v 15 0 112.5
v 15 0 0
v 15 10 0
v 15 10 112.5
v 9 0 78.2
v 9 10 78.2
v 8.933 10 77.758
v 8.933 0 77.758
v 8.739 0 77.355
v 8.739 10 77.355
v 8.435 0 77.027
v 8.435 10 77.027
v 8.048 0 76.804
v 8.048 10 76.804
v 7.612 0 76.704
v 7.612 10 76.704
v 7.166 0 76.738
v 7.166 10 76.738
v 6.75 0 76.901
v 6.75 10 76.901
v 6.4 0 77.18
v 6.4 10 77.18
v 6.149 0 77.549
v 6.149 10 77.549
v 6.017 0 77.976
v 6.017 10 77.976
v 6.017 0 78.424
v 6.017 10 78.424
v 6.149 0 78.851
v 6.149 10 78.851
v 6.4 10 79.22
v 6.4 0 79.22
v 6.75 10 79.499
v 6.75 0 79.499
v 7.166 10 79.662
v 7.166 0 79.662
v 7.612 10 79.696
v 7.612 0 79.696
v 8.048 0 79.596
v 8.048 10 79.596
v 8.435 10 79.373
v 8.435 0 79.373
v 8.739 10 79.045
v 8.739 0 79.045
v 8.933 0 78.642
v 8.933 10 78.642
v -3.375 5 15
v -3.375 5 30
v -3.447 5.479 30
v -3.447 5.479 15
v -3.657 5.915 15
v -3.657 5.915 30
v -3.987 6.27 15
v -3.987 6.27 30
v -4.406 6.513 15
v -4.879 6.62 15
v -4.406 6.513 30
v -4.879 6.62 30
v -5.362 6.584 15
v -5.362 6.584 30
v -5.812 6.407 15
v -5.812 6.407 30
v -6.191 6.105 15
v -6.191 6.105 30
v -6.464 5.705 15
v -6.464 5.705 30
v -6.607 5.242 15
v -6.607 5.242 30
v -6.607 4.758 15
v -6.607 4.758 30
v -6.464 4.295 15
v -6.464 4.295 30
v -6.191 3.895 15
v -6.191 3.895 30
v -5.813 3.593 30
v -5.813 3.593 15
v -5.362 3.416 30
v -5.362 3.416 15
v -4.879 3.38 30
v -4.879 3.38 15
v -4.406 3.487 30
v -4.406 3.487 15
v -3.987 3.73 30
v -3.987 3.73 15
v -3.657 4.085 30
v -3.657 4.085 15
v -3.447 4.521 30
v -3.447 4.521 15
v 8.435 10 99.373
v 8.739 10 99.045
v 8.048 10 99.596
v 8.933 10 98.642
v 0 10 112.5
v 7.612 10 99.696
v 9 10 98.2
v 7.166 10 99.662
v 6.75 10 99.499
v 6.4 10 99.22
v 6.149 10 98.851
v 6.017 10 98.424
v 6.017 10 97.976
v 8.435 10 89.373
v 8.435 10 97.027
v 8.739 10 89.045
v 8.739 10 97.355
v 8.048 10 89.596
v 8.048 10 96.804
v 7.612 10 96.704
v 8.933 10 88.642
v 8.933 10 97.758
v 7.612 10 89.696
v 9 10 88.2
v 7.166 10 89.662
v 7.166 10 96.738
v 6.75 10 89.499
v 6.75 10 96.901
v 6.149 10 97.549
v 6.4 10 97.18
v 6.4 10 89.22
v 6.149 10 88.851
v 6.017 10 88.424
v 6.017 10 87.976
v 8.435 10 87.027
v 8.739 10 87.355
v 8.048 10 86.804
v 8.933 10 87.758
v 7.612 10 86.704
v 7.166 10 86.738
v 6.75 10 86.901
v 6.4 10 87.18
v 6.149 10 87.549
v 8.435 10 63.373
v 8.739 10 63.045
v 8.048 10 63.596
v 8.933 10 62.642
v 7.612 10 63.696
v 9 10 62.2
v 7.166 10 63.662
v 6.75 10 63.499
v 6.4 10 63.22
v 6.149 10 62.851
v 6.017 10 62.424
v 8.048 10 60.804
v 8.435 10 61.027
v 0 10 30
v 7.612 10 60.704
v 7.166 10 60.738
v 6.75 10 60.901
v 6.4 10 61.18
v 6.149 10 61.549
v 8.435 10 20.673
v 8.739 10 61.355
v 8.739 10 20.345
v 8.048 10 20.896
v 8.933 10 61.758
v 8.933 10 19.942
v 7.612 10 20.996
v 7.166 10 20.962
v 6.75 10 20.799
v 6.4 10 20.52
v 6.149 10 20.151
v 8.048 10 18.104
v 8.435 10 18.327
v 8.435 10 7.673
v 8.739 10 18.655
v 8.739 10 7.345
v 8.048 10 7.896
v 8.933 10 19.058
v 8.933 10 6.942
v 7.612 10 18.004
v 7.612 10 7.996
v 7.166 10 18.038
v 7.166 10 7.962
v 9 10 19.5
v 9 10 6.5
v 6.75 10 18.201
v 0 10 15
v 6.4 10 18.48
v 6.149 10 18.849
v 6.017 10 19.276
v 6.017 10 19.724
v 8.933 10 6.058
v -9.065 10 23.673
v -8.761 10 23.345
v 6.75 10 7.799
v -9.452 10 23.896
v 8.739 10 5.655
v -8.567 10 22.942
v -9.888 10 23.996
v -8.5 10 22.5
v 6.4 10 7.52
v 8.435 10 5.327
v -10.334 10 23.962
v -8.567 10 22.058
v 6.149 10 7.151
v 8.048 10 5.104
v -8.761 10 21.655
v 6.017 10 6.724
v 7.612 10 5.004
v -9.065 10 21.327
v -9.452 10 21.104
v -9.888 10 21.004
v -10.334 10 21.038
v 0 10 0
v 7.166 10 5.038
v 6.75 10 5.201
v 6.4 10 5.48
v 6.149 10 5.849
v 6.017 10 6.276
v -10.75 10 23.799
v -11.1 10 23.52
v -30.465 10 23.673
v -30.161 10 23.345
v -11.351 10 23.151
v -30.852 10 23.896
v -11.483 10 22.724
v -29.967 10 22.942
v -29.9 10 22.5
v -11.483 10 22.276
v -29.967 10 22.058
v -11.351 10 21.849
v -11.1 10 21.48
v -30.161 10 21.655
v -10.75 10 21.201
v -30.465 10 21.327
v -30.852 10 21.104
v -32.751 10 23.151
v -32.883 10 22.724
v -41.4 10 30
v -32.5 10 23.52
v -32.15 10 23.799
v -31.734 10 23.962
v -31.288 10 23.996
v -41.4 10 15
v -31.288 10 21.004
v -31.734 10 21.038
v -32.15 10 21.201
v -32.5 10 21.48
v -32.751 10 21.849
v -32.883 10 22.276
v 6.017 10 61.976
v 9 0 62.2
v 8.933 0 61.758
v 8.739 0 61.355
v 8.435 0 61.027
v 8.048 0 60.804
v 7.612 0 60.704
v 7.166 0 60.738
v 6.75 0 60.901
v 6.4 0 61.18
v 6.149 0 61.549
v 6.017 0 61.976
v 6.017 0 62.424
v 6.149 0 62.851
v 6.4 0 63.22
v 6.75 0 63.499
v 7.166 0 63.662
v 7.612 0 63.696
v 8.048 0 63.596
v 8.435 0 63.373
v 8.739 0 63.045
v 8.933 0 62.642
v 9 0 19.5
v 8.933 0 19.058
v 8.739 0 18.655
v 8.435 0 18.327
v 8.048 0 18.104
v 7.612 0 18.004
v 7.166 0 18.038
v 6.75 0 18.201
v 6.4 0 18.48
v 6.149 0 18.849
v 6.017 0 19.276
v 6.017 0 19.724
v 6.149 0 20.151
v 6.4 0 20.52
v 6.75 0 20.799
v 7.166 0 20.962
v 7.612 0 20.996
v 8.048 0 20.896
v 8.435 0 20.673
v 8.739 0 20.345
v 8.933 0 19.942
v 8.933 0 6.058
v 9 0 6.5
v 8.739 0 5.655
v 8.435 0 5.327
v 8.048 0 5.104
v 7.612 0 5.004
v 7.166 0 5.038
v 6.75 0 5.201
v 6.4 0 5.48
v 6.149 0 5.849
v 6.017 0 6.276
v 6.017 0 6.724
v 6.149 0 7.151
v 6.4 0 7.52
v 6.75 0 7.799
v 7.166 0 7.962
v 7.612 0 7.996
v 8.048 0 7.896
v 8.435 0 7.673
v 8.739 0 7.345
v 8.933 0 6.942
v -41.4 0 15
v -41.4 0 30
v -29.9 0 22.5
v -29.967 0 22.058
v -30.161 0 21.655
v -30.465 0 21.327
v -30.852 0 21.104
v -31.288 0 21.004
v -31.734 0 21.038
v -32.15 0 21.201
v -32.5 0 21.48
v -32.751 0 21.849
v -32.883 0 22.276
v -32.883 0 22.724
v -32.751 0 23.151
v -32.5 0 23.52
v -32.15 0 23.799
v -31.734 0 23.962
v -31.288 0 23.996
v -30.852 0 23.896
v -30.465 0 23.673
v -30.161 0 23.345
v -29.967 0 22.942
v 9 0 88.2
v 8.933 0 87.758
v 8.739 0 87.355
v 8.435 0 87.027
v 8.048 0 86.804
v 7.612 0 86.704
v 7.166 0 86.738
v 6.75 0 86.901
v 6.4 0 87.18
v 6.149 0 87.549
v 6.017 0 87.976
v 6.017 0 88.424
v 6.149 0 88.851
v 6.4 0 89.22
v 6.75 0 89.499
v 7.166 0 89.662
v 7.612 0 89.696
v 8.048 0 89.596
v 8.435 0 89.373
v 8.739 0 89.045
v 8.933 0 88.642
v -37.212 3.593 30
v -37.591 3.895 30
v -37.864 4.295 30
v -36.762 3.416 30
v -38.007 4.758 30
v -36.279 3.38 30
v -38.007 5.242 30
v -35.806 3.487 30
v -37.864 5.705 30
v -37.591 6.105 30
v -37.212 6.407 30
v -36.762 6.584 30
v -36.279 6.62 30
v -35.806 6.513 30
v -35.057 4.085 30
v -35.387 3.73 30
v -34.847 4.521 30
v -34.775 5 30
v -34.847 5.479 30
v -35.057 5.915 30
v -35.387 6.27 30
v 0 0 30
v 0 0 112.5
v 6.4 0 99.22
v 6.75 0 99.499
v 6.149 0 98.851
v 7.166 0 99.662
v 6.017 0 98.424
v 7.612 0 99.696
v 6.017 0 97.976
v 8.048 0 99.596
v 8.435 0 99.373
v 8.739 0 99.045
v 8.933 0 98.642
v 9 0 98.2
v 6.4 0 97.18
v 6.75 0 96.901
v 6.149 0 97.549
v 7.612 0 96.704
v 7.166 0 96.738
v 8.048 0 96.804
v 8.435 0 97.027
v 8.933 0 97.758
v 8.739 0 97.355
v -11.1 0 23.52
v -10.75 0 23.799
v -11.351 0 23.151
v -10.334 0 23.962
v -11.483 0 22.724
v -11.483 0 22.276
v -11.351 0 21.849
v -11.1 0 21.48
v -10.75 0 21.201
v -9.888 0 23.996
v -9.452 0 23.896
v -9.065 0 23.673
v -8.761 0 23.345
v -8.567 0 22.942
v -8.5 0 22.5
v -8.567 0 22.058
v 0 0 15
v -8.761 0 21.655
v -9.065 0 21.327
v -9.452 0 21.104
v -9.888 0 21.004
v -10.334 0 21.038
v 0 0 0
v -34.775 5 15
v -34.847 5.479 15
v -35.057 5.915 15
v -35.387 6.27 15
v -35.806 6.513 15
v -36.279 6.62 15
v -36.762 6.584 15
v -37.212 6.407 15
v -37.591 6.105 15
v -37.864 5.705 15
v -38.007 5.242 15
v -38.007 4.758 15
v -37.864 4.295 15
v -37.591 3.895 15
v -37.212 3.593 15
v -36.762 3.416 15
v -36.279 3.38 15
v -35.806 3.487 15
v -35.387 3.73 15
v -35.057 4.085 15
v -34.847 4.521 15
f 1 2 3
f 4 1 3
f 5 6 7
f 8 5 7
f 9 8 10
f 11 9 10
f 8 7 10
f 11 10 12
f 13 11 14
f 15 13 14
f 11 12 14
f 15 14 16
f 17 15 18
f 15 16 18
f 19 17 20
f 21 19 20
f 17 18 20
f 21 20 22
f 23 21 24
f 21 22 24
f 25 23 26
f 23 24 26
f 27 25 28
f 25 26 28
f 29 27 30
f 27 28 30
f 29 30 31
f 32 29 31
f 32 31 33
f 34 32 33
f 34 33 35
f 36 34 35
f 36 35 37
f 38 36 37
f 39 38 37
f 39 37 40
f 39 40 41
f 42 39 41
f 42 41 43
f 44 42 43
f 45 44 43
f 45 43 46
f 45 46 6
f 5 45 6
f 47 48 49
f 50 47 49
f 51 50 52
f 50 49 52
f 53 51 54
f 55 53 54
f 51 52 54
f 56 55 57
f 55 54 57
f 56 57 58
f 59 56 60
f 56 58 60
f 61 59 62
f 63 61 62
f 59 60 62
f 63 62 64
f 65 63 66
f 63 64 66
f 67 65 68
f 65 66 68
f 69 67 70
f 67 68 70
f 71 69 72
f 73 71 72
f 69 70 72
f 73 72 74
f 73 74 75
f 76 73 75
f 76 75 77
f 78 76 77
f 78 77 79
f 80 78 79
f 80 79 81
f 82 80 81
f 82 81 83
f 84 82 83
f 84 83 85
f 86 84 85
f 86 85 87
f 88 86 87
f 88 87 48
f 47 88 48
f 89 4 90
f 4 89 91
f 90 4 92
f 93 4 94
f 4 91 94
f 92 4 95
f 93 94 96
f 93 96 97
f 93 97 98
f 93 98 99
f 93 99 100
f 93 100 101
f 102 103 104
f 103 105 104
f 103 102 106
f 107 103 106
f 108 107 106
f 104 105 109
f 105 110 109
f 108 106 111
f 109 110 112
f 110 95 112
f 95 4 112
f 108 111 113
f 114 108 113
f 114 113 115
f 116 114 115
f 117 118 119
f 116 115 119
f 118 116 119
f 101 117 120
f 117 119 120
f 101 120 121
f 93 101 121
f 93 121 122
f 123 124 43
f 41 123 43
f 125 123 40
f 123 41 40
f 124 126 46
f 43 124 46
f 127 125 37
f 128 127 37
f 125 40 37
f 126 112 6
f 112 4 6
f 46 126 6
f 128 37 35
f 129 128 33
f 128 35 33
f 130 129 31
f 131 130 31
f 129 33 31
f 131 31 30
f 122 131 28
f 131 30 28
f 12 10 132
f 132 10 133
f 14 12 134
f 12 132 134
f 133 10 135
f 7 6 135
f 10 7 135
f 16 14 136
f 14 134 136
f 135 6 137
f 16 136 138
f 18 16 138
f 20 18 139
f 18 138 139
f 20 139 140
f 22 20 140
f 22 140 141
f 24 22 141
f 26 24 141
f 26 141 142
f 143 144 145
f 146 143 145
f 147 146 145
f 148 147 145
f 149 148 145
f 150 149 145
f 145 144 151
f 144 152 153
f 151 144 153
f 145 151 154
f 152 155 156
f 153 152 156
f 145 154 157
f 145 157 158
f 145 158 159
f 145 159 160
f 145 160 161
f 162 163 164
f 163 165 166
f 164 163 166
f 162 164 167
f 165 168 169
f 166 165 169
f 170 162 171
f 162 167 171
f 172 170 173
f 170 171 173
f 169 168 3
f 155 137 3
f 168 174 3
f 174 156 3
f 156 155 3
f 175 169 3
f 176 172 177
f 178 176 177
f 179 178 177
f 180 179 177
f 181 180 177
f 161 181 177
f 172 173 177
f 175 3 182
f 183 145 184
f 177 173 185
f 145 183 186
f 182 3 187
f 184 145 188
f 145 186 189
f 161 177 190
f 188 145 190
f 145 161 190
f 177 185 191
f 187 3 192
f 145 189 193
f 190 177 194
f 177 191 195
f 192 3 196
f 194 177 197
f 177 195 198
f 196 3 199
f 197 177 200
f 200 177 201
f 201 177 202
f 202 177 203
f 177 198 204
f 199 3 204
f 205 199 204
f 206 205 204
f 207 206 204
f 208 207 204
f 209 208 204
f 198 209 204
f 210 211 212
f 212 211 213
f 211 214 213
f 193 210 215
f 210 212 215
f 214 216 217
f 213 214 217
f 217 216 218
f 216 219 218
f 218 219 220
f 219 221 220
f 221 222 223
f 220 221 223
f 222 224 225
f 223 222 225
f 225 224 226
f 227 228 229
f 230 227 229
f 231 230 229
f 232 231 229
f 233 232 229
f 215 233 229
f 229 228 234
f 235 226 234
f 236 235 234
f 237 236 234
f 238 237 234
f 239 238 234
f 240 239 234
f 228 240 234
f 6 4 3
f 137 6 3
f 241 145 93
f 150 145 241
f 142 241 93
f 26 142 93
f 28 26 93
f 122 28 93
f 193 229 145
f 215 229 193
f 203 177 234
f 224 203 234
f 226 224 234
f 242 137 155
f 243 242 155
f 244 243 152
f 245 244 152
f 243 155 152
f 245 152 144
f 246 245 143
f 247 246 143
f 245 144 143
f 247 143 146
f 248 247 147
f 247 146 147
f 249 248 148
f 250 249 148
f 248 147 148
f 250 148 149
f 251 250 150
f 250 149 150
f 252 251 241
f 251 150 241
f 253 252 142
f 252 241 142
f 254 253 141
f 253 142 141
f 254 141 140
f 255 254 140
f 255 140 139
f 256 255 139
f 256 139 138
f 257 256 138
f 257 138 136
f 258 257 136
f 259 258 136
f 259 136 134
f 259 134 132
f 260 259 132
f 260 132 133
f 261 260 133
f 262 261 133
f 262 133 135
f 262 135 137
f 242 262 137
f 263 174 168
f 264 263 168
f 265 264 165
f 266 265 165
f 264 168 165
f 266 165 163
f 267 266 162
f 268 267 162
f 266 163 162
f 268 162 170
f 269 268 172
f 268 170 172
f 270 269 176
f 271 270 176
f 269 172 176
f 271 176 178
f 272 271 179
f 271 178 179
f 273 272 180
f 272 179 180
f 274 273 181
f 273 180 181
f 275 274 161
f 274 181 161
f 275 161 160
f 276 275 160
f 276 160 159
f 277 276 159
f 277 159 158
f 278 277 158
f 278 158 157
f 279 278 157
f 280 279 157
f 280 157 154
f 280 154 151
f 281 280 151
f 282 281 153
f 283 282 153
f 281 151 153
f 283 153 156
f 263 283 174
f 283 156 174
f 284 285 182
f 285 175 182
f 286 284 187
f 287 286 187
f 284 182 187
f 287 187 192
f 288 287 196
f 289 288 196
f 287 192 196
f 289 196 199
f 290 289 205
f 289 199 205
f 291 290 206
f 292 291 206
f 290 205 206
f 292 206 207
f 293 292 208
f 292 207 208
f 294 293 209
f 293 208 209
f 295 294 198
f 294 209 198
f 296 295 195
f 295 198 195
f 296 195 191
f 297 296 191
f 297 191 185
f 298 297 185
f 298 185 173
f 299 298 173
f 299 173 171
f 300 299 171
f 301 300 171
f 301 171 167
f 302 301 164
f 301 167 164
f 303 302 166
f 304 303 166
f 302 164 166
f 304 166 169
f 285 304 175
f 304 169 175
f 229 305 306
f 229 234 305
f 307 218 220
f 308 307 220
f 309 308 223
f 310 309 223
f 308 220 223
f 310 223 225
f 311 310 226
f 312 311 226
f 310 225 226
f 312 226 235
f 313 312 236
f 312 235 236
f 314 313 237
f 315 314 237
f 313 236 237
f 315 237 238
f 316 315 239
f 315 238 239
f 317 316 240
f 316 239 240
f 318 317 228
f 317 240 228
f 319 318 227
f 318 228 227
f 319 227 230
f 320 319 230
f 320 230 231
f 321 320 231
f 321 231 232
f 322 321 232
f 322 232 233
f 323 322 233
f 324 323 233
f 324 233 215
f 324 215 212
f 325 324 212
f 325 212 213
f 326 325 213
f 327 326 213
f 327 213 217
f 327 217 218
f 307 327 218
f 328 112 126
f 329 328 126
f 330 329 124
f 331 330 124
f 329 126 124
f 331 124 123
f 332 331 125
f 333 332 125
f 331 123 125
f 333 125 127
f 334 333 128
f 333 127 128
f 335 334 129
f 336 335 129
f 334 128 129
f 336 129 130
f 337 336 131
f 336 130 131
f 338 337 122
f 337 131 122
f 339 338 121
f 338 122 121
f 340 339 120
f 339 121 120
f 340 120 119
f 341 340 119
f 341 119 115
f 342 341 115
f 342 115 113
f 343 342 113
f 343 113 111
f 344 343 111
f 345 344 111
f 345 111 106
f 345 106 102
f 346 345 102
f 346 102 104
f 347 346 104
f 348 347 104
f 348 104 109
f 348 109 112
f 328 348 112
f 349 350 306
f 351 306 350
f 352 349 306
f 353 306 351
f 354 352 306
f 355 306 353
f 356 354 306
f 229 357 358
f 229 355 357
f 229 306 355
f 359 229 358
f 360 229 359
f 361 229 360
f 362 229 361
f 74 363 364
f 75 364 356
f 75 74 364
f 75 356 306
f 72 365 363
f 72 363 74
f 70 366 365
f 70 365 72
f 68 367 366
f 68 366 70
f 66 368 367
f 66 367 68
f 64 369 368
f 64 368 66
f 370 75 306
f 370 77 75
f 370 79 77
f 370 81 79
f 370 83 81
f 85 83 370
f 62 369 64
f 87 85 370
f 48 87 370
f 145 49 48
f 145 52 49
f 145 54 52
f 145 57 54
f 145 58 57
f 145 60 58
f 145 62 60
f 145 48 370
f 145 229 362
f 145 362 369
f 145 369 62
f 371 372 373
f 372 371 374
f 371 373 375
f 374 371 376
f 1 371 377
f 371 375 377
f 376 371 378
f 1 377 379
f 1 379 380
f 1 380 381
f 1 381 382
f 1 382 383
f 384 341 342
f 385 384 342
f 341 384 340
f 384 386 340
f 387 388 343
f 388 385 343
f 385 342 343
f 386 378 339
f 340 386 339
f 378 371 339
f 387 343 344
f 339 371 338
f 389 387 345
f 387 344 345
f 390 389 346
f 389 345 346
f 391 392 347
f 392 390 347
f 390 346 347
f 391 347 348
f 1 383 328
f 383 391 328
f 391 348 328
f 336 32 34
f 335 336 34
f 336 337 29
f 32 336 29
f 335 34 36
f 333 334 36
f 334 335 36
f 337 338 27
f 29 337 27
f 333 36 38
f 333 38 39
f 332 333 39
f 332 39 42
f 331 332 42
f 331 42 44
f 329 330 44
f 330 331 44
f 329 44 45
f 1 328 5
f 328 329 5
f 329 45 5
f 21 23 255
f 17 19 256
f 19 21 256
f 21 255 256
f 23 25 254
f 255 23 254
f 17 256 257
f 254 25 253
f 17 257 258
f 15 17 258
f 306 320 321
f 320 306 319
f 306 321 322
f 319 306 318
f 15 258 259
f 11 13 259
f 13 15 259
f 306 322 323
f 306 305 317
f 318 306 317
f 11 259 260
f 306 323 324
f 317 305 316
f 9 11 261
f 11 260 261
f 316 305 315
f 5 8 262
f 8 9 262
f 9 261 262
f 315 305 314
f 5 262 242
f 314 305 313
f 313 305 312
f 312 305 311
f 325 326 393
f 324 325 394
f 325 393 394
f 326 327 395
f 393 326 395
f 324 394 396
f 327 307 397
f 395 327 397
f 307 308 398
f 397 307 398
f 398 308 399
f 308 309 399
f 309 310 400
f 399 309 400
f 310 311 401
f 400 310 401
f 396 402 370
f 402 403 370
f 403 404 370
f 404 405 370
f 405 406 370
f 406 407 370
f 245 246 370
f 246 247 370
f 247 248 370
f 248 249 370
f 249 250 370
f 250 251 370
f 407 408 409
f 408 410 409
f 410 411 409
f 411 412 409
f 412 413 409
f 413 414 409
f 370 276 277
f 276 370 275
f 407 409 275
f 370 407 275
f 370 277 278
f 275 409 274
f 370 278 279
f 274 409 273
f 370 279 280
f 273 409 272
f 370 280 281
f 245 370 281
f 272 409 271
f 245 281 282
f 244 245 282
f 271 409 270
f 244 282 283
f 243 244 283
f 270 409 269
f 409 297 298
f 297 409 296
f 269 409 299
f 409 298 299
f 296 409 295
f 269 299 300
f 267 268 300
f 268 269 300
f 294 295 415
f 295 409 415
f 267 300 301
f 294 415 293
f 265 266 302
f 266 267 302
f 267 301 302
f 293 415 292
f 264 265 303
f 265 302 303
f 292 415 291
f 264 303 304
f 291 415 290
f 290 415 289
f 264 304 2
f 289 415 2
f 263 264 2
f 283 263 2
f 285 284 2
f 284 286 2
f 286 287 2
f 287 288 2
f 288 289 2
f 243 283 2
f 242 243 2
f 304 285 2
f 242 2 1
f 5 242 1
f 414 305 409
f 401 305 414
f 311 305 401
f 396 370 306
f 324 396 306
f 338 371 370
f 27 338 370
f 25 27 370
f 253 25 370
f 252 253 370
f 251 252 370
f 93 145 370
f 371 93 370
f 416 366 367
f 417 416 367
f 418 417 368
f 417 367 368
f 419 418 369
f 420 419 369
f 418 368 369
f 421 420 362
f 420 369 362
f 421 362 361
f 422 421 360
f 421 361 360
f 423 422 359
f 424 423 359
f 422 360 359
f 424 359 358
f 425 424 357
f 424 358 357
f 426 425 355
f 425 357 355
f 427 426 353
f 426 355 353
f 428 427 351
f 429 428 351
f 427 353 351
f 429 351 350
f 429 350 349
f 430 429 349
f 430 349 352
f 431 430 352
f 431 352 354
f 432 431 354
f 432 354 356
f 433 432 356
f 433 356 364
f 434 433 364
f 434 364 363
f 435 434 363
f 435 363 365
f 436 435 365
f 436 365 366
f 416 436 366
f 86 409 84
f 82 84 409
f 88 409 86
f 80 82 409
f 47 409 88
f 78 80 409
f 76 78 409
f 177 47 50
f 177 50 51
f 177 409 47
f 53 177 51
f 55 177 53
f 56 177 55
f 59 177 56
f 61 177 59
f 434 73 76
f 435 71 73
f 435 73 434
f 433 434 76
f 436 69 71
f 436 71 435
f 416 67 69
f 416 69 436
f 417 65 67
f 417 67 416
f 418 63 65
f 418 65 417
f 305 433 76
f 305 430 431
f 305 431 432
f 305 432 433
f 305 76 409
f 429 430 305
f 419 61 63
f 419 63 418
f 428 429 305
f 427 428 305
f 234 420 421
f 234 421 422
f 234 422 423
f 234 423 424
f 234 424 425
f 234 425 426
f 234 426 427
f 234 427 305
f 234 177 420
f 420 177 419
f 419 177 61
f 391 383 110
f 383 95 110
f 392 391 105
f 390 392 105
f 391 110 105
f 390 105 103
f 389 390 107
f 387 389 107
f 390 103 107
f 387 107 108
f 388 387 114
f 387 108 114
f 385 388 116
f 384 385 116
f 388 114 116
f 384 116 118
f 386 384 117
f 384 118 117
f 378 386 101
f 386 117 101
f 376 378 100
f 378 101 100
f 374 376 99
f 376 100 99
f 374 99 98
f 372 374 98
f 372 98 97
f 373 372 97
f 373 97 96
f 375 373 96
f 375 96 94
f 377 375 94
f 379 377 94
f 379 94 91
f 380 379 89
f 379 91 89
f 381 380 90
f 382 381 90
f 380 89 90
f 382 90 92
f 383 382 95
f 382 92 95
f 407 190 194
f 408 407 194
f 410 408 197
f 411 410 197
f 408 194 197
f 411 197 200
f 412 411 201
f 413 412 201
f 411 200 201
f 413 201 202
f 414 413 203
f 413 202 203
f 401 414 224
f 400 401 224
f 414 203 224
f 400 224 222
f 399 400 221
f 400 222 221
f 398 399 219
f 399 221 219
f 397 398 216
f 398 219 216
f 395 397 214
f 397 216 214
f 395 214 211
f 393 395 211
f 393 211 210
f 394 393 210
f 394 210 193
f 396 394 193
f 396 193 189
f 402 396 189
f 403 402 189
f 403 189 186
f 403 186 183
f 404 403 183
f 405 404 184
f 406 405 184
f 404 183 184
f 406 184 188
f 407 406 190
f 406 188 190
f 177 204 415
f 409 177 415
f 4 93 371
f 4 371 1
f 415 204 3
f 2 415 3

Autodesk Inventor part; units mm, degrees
ref_plane "YZ Plane" through (0, 0, 0) normal (1, 0, 0) x (0, 1, 0)
ref_plane "XZ Plane" through (0, 0, 0) normal (0, 1, 0) x (-1, 0, 0)
ref_plane "XY Plane" through (0, 0, 0) normal (0, 0, 1) x (1, 0, 0)
sketch "Sketch1" plane through (0, 0, 0) normal (0, 0, 1) x (1, 0, 0)
  line L0 (0, 0) -> (15, 0)
  line L1 (15, 0) -> (15, 10)
  line L2 (15, 10) -> (0, 10)
  line L3 (0, 10) -> (0, 0)
  line L4 (1, 9) -> (14, 9)
  line L5 (14, 9) -> (14, 1)
  line L6 (14, 1) -> (1, 1)
  line L7 (1, 1) -> (1, 9)
  dimension "d0" = 15
  dimension "d1" = 10
  dimension "d2" = 13
  dimension "d3" = 8
  dimension "d4" = 1
  dimension "d5" = 1
extrude "Extrusion1" add sketch "Sketch1" along normal blind 112.5 contours L3 L2 L1 L0 | L4 L5 L6 L7
sketch "Sketch2" plane through (0, 10, 0) normal (0, 1, 0) x (1, 0, 0)
  line L0 (15, 0) -> (0, 0) projected
  line L1 (0, 0) -> (0, -112.5) projected
  line L2 (15, -112.5) -> (0, -112.5) projected
  line L3 (15, 0) -> (15, -112.5) projected
  circle A0 centre (7.5, -6.5) radius 1.5
  circle A1 centre (7.5, -98.2) radius 1.5
  circle A2 centre (7.5, -19.5) radius 1.5
  circle A3 centre (7.5, -88.2) radius 1.5
  circle A4 centre (7.5, -78.2) radius 1.5
  circle A5 centre (7.5, -62.2) radius 1.5
  dimension "d8" = 3
  dimension "d9" = 3
  dimension "d10" = 7.5
  dimension "d11" = 7.5
  dimension "d13" = 14.3
  dimension "d24" = 3
  dimension "d25" = 3
  dimension "d26" = 3
  dimension "d27" = 3
  dimension "d28" = 7.5
  dimension "d29" = 7.5
  dimension "d30" = 7.5
  dimension "d31" = 7.5
  dimension "d32" = 13
  dimension "d33" = 10
  dimension "d34" = 10
  dimension "d35" = 16
  dimension "d55" = 6.5
extrude "Extrusion2" cut sketch "Sketch2" against normal up to surface (10 mm away) contours A0 | A1 | A2 | A3 | A4 | A5
sketch "Sketch3" plane through (15, 0, 0) normal (1, 0, 0) x (0, 0, -1)
  line L0 (0, 0) -> (0, 10) projected
  line L1 (0, 10) -> (-112.5, 10) projected
  line L2 (-112.5, 0) -> (-112.5, 10) projected
  line L3 (0, 0) -> (-112.5, 0) projected
  circle A0 centre (-9, 5) radius 1.5
  circle A1 centre (-107.5, 5) radius 1.5
  dimension "d16" = 3
  dimension "d17" = 5
  dimension "d18" = 9
  dimension "d21" = 3
  dimension "d22" = 5
  dimension "d23" = 5
extrude "Extrusion3" [suppressed]
sketch "Sketch4" plane through (0, 10, 0) normal (0, 1, 0) x (1, 0, 0)
  circle A0 centre (7.5, -62.2) radius 1.5 projected
  circle A1 centre (7.5, -88.2) radius 1.5 projected
  circle A2 centre (7.5, -98.2) radius 1.5 projected
  circle A3 centre (7.5, -19.5) radius 1.5 projected
  circle A4 centre (7.5, -78.2) radius 1.5 projected
  circle A5 centre (7.5, -6.5) radius 1.5 projected
  line L0 (15, 0) -> (0, 0) projected
  line L1 (0, 0) -> (0, -112.5) projected
  line L2 (15, -112.5) -> (0, -112.5) projected
  line L3 (15, 0) -> (15, -112.5) projected
  line L4 (0, 0) -> (0, -112.5) projected
  line L5 (0, -15) -> (-41.4, -15)
  line L6 (-41.4, -15) -> (-41.4, -30)
  line L7 (-41.4, -30) -> (0, -30)
  line L8 (0, -30) -> (0, -15)
  circle A6 centre (-10, -22.5) radius 1.5
  circle A7 centre (-31.4, -22.5) radius 1.5
  point P0 (0, -30)
  dimension "d36" = 15
  dimension "d37" = 15
  dimension "d38" = 41.4
  dimension "d39" = 3
  dimension "d40" = 3
  dimension "d41" = 7.5
  dimension "d42" = 7.5
  dimension "d43" = 10
  dimension "d44" = 10
extrude "Extrusion4" add sketch "Sketch4" against normal blind 10 contours L1 L7 L6 L5
sketch "Sketch5" plane through (-41.4, 10, 30) normal (0, 0, 1) x (1, 0, 0)
  line L0 (0, 0) -> (41.4, 0) projected
  line L1 (0, 0) -> (0, -10) projected
  line L2 (41.4, -10) -> (0, -10) projected
  line L3 (41.4, 0) -> (41.4, -10) projected
  circle A0 centre (5, -5) radius 1.625
  circle A1 centre (36.4, -5) radius 1.625
  point P0 (41.4, -10)
  dimension "d47" = 3.25
  dimension "d48" = 3.25
  dimension "d49" = 5
  dimension "d50" = 5
  dimension "d51" = 5
  dimension "d52" = 5
extrude "Extrusion5" cut sketch "Sketch5" against normal up to surface (15 mm away) contours A0 | A1
properties part number "profile4_3D" material "Aluminum 6061, Welded"
